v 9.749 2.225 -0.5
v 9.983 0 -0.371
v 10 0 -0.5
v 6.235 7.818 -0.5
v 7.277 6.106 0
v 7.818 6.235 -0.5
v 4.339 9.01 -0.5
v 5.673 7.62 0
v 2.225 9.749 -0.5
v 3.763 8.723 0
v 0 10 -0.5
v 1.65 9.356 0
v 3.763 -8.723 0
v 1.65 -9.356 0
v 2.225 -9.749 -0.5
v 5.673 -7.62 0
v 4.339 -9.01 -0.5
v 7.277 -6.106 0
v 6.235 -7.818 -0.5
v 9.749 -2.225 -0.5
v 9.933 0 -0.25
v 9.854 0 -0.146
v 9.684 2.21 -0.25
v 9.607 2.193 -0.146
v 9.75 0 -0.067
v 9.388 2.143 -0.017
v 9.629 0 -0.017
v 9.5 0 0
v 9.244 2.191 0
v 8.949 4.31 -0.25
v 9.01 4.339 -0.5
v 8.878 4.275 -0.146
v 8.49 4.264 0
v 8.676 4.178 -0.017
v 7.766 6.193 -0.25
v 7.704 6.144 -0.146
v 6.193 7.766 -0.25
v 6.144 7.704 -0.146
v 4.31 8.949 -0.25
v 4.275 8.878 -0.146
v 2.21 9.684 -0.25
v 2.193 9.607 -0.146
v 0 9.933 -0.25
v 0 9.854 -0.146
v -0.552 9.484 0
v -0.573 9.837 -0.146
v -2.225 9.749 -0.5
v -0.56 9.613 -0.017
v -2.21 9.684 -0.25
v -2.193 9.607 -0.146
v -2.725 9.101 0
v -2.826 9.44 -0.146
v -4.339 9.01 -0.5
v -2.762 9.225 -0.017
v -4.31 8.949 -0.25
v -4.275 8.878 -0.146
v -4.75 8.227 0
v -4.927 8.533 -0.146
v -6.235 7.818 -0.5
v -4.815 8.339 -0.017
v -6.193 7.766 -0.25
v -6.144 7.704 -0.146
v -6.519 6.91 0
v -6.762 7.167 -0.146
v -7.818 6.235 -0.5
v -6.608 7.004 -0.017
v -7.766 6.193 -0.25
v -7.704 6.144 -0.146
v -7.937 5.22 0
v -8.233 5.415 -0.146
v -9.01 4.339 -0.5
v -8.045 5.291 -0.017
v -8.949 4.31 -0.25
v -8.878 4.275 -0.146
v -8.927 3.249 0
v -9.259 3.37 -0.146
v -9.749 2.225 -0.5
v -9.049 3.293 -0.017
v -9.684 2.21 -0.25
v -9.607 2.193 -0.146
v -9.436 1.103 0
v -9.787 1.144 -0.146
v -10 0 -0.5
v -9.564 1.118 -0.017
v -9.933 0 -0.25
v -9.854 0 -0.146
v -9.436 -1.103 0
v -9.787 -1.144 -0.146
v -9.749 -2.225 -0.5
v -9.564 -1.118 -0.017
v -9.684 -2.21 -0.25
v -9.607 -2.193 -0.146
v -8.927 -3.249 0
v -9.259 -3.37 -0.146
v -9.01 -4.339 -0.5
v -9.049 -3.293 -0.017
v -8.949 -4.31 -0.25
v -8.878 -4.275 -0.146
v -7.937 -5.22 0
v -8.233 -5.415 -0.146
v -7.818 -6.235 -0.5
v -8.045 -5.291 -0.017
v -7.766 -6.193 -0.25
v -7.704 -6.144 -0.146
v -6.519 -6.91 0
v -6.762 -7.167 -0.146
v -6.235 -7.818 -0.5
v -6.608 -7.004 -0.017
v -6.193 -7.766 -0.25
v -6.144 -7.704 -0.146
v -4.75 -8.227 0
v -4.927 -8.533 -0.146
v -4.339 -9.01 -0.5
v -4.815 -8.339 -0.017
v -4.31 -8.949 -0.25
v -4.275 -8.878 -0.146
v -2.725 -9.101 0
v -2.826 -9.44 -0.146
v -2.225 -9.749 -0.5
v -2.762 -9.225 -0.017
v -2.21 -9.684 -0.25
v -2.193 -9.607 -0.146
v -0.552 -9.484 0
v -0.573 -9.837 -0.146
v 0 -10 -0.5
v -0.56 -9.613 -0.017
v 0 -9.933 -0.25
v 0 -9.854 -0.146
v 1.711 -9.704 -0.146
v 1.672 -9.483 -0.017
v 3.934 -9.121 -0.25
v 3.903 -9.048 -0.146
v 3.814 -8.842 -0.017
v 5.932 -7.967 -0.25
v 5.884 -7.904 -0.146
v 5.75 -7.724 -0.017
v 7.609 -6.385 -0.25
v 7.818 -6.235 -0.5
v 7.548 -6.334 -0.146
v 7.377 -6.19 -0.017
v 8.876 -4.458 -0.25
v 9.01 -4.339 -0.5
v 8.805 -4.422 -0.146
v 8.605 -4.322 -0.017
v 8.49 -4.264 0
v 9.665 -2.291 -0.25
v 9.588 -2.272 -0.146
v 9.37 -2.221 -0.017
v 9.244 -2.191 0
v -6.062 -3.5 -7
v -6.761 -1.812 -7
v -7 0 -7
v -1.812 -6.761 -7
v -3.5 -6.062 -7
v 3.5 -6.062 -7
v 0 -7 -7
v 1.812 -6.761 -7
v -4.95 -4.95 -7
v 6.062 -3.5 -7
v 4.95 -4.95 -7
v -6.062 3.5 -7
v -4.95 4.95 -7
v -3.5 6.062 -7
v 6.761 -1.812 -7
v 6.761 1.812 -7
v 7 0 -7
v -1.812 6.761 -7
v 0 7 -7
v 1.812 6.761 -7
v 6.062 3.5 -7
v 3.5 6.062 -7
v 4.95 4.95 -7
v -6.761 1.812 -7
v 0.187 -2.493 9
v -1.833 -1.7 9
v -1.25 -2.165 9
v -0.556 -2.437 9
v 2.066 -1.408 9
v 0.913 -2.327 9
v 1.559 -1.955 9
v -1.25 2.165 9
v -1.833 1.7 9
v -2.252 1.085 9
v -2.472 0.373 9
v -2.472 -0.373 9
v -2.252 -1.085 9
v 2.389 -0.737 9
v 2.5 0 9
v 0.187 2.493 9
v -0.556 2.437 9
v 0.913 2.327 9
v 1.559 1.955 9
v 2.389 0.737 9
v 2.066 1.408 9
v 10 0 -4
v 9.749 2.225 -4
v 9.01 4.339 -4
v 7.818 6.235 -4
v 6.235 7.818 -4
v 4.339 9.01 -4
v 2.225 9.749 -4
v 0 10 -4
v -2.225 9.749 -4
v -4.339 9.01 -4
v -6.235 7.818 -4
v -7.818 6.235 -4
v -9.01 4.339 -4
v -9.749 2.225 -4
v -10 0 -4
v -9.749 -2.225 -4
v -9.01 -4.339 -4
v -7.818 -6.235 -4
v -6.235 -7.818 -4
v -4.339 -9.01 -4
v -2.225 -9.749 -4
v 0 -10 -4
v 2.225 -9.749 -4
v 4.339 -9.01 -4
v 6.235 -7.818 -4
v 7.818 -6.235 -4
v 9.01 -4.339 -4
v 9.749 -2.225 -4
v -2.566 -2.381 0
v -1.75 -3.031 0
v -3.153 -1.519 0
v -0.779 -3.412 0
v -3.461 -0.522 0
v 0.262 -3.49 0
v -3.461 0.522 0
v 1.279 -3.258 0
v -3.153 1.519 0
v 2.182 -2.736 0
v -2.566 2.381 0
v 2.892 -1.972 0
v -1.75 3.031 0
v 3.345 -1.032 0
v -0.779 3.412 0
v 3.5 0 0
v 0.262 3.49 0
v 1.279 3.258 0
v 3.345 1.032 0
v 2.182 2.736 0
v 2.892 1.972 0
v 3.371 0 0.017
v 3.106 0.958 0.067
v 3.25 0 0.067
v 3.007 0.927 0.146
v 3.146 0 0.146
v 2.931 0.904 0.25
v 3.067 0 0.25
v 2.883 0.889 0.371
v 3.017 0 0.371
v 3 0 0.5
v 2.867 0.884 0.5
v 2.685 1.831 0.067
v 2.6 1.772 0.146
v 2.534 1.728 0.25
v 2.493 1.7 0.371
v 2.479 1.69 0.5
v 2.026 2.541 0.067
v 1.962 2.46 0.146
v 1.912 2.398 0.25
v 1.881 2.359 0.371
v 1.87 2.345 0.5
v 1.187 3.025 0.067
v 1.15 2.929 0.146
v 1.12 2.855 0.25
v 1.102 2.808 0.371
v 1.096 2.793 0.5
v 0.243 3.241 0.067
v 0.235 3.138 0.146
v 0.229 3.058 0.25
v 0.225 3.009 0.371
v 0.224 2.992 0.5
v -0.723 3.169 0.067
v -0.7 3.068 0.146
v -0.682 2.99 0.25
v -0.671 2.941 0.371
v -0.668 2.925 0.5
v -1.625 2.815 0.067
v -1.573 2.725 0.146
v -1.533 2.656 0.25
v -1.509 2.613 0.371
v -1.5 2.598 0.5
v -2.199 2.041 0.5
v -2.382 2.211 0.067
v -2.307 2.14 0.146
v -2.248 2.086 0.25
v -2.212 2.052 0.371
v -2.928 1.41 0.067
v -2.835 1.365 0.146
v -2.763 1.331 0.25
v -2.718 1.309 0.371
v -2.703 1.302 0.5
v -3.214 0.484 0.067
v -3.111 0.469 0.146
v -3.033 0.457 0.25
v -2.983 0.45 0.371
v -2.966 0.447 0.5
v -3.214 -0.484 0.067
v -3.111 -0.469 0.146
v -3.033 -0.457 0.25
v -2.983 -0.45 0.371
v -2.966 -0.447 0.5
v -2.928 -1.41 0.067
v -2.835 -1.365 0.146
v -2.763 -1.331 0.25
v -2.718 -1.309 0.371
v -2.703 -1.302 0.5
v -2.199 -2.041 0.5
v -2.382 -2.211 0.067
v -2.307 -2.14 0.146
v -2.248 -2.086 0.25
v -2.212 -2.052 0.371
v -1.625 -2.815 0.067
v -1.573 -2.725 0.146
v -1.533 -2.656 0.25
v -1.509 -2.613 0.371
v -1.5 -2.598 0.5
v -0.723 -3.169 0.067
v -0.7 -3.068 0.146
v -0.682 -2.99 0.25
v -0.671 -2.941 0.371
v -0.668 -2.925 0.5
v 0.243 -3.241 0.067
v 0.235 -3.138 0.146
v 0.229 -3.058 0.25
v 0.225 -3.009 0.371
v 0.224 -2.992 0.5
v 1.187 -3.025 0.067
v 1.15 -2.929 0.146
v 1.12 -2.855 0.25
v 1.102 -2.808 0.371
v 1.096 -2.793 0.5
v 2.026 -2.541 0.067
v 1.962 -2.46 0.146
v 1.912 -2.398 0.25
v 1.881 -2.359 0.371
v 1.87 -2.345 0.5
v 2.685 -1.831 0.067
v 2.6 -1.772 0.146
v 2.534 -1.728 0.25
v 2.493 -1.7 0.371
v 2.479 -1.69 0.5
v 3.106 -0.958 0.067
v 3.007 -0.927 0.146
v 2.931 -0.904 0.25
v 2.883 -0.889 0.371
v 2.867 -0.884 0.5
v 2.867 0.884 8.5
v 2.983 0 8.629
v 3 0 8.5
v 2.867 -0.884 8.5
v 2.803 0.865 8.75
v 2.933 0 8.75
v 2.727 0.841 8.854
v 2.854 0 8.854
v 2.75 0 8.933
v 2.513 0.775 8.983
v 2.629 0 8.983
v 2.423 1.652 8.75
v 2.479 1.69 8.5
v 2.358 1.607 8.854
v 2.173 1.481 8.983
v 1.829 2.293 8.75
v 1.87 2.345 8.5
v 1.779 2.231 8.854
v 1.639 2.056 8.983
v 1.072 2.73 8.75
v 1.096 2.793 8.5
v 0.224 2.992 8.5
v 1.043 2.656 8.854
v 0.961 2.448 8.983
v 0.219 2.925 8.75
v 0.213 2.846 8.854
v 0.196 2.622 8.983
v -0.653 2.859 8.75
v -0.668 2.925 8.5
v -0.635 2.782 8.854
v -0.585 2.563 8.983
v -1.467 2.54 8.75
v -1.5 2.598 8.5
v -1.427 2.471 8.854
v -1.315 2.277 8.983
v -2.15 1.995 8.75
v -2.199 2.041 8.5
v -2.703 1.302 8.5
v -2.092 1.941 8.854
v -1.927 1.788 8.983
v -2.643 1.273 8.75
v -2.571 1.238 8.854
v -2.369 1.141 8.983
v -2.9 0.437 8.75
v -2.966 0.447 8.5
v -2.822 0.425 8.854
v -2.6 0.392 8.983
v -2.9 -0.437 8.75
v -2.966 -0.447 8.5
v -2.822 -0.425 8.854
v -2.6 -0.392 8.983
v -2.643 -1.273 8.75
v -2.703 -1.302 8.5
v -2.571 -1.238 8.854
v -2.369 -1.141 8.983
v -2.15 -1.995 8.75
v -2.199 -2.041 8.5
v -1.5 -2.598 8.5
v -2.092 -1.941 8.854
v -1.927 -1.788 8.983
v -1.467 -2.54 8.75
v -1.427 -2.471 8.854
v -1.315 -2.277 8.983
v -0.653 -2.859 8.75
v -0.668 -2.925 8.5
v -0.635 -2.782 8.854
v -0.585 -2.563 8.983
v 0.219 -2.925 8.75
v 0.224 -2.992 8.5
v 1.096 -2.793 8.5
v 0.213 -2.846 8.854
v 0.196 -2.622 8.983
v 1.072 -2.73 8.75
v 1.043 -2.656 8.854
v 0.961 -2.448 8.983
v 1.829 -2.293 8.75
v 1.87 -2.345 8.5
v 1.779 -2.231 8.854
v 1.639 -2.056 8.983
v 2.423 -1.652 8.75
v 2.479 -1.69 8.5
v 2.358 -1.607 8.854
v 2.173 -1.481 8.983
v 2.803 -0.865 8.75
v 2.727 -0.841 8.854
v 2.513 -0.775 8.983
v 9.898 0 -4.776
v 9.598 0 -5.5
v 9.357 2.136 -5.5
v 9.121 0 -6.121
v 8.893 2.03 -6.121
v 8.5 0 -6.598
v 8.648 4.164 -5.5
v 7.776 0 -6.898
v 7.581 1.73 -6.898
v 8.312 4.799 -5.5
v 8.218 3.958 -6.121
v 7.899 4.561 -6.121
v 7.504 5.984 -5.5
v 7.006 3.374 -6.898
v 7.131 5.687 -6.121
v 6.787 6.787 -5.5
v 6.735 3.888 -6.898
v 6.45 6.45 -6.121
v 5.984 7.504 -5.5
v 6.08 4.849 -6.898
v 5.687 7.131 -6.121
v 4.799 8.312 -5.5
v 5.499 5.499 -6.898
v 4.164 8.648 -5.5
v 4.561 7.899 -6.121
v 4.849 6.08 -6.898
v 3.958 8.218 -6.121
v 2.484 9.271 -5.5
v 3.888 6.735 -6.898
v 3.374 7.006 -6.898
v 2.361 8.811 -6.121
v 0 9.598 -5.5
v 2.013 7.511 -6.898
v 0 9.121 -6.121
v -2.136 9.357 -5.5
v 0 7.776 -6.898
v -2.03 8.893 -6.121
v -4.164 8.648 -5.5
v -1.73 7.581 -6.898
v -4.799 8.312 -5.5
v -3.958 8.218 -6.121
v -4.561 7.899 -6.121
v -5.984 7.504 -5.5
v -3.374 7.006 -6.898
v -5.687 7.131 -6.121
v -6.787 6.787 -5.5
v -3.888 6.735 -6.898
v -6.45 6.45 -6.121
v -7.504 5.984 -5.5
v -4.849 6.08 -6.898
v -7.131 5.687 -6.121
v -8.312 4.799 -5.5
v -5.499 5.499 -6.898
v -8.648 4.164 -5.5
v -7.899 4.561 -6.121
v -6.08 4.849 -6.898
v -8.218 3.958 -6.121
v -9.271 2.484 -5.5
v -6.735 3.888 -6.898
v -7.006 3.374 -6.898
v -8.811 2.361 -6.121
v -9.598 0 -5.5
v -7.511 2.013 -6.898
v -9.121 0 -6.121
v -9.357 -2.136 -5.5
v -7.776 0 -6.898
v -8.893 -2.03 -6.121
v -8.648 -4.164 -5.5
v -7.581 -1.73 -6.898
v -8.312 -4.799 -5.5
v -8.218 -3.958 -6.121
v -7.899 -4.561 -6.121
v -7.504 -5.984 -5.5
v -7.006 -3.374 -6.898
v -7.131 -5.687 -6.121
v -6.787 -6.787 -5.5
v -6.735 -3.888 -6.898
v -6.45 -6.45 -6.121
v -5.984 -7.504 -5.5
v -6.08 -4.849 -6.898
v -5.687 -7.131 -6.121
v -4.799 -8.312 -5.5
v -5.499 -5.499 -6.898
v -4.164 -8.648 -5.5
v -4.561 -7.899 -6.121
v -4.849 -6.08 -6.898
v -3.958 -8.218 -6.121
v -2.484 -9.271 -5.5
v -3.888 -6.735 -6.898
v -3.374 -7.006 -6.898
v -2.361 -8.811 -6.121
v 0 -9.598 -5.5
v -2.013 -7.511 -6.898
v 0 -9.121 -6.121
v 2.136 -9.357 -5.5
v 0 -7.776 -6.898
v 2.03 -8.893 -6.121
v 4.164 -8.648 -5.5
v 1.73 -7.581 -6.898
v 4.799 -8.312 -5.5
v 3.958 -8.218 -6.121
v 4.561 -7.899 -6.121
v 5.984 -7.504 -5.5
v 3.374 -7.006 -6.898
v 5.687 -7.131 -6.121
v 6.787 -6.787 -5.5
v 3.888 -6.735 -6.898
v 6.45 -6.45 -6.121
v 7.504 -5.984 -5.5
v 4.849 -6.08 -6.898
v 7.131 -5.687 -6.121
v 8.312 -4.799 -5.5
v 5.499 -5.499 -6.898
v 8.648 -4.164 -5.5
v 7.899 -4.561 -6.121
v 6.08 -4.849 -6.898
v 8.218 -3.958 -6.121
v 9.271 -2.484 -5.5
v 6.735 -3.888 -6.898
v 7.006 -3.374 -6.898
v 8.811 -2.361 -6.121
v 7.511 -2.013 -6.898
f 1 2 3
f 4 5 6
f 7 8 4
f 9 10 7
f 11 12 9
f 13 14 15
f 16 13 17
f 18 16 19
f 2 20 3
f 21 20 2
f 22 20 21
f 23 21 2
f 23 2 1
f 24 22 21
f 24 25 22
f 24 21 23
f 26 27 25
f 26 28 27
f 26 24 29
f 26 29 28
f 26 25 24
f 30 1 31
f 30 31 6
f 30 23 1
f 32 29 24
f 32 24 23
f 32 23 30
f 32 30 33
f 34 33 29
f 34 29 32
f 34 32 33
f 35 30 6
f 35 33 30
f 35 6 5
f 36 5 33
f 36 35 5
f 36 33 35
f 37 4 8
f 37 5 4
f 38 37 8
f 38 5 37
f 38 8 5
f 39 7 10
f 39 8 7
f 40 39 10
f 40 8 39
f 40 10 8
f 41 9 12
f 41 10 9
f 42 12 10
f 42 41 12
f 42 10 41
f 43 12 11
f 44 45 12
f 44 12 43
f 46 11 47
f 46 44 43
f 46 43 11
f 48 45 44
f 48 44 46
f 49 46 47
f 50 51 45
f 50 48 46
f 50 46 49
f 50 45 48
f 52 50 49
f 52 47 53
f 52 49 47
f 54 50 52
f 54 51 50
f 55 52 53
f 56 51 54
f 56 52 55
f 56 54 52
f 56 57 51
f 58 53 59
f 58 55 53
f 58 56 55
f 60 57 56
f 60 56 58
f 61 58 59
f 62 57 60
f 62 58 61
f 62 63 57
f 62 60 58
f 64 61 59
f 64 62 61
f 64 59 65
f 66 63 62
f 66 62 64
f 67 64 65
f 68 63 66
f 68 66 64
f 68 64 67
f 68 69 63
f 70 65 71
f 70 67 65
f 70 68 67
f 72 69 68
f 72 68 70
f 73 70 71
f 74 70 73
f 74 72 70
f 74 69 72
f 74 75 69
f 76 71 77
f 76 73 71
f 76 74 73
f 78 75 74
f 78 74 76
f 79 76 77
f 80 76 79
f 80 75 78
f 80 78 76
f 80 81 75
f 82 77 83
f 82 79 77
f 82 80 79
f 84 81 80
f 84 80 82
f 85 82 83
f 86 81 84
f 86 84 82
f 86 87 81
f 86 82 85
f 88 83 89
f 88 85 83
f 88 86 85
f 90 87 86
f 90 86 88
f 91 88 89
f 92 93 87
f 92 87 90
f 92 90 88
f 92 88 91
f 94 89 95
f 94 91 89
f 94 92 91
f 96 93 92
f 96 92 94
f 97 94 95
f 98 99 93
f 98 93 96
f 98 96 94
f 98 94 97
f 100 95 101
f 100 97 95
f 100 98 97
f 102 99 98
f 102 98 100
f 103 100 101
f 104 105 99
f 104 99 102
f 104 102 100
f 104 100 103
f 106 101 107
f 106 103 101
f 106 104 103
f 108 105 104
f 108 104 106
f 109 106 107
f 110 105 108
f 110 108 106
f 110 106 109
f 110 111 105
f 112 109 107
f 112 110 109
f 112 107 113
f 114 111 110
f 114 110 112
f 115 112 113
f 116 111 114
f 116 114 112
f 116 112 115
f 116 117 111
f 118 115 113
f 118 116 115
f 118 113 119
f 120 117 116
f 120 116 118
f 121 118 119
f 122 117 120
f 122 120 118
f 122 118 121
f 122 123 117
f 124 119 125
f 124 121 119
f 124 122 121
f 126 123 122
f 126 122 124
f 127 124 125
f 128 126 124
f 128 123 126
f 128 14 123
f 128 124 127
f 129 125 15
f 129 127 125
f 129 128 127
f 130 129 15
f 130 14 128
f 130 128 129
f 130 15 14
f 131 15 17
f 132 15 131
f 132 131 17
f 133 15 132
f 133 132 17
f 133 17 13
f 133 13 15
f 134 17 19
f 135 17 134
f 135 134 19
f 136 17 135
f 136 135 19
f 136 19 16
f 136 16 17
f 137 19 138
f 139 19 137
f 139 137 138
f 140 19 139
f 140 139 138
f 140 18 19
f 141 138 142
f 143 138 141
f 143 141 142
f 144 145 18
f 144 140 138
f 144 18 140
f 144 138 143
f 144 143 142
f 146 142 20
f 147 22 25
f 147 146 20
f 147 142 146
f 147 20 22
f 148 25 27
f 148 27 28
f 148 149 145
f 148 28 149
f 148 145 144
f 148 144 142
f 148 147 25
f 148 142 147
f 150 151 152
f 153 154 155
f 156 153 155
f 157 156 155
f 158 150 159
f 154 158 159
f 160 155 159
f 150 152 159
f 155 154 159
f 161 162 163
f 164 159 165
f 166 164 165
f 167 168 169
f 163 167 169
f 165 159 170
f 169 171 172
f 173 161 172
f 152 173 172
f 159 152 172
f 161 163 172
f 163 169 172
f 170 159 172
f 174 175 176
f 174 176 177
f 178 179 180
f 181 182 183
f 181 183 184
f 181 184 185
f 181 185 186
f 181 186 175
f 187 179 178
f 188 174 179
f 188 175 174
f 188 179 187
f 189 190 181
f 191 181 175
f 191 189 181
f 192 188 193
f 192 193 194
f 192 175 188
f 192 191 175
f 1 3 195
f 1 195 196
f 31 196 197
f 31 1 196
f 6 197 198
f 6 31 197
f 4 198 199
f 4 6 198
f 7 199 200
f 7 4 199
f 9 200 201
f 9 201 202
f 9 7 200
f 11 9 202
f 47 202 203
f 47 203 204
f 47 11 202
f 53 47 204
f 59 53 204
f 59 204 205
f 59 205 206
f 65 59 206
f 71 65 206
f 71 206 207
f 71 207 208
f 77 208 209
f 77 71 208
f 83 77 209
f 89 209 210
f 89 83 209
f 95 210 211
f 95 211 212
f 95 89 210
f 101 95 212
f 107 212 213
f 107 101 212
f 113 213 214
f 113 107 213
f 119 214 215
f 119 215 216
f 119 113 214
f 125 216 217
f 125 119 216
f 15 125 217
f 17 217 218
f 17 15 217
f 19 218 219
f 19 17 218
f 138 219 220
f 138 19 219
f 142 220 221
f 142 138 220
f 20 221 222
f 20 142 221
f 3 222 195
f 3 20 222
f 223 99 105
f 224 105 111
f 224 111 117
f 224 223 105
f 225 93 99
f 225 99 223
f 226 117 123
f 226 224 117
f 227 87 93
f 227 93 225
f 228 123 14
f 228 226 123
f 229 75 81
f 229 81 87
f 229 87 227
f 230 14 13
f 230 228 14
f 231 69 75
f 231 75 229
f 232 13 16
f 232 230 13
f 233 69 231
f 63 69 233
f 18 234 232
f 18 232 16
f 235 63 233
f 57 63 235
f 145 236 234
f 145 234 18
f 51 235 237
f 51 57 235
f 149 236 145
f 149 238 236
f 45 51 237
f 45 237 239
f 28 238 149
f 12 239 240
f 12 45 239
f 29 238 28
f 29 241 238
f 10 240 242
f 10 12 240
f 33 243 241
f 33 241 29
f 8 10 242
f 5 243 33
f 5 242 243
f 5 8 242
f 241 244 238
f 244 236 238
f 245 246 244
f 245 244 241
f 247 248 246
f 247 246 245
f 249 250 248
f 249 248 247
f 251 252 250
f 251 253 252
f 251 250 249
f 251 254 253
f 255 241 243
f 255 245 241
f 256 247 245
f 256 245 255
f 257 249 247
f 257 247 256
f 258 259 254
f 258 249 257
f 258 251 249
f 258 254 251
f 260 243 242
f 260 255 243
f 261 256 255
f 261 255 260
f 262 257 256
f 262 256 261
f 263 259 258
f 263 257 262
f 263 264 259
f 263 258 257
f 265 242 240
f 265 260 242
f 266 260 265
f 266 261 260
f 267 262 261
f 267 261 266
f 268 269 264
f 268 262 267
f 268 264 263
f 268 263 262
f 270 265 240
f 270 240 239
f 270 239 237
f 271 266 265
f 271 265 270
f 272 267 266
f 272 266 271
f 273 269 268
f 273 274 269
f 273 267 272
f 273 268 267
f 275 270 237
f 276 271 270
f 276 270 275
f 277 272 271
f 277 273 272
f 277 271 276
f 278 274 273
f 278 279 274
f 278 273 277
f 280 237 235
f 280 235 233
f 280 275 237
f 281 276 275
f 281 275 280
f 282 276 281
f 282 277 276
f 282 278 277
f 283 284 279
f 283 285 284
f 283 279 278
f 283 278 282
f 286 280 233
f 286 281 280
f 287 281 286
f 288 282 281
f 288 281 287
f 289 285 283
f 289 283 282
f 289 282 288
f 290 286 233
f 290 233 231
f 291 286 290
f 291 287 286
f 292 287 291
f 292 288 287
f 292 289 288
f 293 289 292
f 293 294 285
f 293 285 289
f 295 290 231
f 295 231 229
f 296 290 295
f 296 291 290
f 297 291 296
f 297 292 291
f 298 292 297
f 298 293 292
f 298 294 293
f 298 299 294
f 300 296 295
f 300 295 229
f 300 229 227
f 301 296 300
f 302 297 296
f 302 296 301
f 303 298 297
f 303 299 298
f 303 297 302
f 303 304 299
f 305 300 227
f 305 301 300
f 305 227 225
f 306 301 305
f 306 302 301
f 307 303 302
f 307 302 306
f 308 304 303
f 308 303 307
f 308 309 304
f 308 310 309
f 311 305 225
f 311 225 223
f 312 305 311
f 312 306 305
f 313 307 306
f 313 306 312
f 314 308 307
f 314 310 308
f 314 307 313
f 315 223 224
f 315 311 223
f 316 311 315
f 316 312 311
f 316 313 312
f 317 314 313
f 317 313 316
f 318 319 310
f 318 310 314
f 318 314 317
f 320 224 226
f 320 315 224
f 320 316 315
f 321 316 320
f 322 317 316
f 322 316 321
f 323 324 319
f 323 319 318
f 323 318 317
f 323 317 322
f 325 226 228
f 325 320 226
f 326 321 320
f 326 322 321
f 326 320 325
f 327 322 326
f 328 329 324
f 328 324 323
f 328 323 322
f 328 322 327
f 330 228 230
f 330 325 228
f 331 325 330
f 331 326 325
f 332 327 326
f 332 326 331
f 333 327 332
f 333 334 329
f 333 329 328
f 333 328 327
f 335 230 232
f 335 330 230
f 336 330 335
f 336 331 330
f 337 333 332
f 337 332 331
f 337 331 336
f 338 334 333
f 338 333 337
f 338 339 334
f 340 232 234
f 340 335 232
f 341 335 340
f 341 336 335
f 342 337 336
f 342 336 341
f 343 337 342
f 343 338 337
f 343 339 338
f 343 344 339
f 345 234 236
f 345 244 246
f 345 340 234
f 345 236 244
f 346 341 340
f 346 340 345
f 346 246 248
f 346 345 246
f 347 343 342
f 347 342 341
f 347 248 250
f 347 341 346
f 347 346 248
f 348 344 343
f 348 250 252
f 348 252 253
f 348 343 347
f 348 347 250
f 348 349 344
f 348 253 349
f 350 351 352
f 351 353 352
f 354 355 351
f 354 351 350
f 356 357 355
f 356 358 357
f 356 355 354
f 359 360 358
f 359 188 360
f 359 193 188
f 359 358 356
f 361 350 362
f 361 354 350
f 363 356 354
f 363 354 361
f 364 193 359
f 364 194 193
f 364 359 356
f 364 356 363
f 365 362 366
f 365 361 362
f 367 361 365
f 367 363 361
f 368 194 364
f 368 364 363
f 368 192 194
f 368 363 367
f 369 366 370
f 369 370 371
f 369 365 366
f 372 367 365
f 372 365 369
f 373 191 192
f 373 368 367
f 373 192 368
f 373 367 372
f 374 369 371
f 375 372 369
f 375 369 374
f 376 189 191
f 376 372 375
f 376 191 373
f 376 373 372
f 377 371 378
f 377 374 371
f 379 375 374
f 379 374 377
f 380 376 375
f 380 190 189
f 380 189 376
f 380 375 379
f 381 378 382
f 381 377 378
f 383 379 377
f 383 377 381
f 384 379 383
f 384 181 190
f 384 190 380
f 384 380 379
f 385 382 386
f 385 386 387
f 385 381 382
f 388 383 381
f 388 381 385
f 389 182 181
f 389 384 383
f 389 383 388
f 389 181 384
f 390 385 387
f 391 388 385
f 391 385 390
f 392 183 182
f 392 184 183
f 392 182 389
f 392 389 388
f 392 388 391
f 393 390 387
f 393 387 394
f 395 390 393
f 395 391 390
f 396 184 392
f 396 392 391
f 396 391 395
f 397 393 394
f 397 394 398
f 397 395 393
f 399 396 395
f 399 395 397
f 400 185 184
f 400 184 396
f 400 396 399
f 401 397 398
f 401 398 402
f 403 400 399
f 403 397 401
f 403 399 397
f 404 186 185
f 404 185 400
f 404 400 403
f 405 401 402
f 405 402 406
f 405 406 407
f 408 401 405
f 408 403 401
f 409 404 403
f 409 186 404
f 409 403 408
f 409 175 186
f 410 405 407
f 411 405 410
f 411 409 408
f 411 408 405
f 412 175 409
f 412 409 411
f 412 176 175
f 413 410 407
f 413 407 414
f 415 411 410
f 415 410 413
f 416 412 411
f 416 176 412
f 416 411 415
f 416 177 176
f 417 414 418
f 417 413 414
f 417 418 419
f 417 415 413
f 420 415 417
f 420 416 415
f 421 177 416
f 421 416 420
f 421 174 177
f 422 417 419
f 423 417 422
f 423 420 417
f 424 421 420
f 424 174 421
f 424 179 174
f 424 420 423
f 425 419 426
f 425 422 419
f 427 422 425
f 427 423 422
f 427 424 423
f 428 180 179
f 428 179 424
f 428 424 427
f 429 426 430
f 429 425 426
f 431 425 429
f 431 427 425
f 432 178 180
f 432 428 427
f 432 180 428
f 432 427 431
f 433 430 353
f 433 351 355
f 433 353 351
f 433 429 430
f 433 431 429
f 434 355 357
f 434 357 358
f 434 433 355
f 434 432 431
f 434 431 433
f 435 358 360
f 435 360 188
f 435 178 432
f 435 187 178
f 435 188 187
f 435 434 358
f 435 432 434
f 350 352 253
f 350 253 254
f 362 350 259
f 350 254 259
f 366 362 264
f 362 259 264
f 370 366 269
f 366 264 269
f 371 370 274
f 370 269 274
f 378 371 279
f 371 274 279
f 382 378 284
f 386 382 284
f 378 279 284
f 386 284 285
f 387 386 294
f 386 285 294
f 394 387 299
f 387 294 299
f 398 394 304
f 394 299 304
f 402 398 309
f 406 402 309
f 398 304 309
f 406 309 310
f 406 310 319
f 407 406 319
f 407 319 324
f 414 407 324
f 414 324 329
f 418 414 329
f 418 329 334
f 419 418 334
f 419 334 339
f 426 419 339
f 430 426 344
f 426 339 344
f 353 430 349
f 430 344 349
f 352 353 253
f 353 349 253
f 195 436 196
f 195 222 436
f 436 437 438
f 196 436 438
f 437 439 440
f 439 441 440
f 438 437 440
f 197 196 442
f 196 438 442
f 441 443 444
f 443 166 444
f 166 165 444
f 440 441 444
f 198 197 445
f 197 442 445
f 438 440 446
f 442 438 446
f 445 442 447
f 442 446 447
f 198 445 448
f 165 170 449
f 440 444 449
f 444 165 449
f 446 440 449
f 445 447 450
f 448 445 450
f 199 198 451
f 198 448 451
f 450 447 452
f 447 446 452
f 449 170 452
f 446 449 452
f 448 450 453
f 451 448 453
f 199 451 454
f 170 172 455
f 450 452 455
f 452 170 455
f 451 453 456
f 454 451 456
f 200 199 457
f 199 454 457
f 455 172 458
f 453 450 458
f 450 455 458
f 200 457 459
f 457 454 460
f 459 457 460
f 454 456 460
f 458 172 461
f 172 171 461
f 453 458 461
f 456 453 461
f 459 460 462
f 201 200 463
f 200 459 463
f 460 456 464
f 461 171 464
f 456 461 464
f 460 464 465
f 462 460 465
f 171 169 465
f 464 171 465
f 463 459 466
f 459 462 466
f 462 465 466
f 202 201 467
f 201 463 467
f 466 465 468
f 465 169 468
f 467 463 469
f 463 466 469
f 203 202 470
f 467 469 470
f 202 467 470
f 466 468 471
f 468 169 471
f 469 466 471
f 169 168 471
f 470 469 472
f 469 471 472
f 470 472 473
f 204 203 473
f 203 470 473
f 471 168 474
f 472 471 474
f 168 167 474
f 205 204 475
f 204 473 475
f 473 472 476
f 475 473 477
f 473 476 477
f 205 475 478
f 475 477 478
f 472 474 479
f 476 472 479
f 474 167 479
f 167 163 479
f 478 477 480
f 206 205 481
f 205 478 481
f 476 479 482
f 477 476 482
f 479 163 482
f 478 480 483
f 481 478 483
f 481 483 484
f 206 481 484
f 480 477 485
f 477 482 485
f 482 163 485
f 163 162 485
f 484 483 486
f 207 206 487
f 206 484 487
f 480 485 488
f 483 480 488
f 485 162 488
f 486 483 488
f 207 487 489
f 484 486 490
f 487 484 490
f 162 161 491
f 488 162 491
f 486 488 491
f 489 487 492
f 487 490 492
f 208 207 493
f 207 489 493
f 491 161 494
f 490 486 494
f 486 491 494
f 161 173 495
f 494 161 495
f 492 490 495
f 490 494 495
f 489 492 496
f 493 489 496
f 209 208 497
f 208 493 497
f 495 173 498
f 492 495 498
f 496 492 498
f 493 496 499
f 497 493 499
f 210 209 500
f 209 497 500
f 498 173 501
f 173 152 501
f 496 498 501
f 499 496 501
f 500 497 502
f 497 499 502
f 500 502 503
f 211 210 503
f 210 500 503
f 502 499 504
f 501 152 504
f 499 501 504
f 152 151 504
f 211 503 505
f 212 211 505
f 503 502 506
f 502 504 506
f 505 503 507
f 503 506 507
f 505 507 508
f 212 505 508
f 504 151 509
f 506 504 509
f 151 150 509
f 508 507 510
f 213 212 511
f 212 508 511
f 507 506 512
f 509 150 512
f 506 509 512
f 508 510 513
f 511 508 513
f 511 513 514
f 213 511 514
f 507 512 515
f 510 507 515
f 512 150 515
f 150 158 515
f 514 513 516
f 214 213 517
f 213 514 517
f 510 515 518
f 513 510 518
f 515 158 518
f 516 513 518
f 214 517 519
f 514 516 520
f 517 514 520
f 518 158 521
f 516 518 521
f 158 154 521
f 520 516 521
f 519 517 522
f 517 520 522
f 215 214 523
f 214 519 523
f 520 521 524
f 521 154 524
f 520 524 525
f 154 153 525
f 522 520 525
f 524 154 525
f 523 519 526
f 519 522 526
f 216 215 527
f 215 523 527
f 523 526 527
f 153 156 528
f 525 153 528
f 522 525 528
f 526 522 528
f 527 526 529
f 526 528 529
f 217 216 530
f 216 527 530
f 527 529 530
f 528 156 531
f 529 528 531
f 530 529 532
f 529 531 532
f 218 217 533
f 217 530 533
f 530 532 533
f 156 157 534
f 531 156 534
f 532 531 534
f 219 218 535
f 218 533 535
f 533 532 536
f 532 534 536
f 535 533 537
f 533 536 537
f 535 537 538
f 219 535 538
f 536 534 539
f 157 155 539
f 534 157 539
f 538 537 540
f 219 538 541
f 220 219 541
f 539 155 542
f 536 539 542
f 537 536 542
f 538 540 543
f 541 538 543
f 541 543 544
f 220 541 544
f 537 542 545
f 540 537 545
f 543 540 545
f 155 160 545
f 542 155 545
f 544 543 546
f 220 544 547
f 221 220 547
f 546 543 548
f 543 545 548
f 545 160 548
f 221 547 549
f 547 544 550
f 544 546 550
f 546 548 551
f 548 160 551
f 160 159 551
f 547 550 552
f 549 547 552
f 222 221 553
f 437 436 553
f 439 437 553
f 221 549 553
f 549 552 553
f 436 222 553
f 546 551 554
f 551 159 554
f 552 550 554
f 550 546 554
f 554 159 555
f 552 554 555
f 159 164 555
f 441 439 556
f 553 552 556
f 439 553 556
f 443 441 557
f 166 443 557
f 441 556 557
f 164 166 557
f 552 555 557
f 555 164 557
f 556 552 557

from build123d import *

# Parameters (mm, degrees)
F0_R     = 10
F1_DEPTH = 7
F2_R     = 3
F3_DEPTH = 9
F4_R     = 3
F5_R     = 0.5


with BuildPart() as f1:
    # F0 (on Top) → F1 (new body)
    with BuildSketch(Plane.XY):
        Circle(F0_R)
    extrude(amount=-F1_DEPTH)

    # F2 (on face) → F3 (join)
    with BuildSketch(Plane.XY):
        Circle(F2_R)
    extrude(amount=F3_DEPTH)

    # F4
    f4_edges = [f1.edges().sort_by_distance(p)[0] for p in [
        (-10, 0, -7),
    ]]
    fillet(f4_edges, radius=F4_R)

    # F5
    f5_edges = [f1.edges().sort_by_distance(p)[0] for p in [
        (-10, 0, 0),
        (-3, 0, 9),
        (-3, 0, 0),
    ]]
    fillet(f5_edges, radius=F5_R)


solid = f1.part
